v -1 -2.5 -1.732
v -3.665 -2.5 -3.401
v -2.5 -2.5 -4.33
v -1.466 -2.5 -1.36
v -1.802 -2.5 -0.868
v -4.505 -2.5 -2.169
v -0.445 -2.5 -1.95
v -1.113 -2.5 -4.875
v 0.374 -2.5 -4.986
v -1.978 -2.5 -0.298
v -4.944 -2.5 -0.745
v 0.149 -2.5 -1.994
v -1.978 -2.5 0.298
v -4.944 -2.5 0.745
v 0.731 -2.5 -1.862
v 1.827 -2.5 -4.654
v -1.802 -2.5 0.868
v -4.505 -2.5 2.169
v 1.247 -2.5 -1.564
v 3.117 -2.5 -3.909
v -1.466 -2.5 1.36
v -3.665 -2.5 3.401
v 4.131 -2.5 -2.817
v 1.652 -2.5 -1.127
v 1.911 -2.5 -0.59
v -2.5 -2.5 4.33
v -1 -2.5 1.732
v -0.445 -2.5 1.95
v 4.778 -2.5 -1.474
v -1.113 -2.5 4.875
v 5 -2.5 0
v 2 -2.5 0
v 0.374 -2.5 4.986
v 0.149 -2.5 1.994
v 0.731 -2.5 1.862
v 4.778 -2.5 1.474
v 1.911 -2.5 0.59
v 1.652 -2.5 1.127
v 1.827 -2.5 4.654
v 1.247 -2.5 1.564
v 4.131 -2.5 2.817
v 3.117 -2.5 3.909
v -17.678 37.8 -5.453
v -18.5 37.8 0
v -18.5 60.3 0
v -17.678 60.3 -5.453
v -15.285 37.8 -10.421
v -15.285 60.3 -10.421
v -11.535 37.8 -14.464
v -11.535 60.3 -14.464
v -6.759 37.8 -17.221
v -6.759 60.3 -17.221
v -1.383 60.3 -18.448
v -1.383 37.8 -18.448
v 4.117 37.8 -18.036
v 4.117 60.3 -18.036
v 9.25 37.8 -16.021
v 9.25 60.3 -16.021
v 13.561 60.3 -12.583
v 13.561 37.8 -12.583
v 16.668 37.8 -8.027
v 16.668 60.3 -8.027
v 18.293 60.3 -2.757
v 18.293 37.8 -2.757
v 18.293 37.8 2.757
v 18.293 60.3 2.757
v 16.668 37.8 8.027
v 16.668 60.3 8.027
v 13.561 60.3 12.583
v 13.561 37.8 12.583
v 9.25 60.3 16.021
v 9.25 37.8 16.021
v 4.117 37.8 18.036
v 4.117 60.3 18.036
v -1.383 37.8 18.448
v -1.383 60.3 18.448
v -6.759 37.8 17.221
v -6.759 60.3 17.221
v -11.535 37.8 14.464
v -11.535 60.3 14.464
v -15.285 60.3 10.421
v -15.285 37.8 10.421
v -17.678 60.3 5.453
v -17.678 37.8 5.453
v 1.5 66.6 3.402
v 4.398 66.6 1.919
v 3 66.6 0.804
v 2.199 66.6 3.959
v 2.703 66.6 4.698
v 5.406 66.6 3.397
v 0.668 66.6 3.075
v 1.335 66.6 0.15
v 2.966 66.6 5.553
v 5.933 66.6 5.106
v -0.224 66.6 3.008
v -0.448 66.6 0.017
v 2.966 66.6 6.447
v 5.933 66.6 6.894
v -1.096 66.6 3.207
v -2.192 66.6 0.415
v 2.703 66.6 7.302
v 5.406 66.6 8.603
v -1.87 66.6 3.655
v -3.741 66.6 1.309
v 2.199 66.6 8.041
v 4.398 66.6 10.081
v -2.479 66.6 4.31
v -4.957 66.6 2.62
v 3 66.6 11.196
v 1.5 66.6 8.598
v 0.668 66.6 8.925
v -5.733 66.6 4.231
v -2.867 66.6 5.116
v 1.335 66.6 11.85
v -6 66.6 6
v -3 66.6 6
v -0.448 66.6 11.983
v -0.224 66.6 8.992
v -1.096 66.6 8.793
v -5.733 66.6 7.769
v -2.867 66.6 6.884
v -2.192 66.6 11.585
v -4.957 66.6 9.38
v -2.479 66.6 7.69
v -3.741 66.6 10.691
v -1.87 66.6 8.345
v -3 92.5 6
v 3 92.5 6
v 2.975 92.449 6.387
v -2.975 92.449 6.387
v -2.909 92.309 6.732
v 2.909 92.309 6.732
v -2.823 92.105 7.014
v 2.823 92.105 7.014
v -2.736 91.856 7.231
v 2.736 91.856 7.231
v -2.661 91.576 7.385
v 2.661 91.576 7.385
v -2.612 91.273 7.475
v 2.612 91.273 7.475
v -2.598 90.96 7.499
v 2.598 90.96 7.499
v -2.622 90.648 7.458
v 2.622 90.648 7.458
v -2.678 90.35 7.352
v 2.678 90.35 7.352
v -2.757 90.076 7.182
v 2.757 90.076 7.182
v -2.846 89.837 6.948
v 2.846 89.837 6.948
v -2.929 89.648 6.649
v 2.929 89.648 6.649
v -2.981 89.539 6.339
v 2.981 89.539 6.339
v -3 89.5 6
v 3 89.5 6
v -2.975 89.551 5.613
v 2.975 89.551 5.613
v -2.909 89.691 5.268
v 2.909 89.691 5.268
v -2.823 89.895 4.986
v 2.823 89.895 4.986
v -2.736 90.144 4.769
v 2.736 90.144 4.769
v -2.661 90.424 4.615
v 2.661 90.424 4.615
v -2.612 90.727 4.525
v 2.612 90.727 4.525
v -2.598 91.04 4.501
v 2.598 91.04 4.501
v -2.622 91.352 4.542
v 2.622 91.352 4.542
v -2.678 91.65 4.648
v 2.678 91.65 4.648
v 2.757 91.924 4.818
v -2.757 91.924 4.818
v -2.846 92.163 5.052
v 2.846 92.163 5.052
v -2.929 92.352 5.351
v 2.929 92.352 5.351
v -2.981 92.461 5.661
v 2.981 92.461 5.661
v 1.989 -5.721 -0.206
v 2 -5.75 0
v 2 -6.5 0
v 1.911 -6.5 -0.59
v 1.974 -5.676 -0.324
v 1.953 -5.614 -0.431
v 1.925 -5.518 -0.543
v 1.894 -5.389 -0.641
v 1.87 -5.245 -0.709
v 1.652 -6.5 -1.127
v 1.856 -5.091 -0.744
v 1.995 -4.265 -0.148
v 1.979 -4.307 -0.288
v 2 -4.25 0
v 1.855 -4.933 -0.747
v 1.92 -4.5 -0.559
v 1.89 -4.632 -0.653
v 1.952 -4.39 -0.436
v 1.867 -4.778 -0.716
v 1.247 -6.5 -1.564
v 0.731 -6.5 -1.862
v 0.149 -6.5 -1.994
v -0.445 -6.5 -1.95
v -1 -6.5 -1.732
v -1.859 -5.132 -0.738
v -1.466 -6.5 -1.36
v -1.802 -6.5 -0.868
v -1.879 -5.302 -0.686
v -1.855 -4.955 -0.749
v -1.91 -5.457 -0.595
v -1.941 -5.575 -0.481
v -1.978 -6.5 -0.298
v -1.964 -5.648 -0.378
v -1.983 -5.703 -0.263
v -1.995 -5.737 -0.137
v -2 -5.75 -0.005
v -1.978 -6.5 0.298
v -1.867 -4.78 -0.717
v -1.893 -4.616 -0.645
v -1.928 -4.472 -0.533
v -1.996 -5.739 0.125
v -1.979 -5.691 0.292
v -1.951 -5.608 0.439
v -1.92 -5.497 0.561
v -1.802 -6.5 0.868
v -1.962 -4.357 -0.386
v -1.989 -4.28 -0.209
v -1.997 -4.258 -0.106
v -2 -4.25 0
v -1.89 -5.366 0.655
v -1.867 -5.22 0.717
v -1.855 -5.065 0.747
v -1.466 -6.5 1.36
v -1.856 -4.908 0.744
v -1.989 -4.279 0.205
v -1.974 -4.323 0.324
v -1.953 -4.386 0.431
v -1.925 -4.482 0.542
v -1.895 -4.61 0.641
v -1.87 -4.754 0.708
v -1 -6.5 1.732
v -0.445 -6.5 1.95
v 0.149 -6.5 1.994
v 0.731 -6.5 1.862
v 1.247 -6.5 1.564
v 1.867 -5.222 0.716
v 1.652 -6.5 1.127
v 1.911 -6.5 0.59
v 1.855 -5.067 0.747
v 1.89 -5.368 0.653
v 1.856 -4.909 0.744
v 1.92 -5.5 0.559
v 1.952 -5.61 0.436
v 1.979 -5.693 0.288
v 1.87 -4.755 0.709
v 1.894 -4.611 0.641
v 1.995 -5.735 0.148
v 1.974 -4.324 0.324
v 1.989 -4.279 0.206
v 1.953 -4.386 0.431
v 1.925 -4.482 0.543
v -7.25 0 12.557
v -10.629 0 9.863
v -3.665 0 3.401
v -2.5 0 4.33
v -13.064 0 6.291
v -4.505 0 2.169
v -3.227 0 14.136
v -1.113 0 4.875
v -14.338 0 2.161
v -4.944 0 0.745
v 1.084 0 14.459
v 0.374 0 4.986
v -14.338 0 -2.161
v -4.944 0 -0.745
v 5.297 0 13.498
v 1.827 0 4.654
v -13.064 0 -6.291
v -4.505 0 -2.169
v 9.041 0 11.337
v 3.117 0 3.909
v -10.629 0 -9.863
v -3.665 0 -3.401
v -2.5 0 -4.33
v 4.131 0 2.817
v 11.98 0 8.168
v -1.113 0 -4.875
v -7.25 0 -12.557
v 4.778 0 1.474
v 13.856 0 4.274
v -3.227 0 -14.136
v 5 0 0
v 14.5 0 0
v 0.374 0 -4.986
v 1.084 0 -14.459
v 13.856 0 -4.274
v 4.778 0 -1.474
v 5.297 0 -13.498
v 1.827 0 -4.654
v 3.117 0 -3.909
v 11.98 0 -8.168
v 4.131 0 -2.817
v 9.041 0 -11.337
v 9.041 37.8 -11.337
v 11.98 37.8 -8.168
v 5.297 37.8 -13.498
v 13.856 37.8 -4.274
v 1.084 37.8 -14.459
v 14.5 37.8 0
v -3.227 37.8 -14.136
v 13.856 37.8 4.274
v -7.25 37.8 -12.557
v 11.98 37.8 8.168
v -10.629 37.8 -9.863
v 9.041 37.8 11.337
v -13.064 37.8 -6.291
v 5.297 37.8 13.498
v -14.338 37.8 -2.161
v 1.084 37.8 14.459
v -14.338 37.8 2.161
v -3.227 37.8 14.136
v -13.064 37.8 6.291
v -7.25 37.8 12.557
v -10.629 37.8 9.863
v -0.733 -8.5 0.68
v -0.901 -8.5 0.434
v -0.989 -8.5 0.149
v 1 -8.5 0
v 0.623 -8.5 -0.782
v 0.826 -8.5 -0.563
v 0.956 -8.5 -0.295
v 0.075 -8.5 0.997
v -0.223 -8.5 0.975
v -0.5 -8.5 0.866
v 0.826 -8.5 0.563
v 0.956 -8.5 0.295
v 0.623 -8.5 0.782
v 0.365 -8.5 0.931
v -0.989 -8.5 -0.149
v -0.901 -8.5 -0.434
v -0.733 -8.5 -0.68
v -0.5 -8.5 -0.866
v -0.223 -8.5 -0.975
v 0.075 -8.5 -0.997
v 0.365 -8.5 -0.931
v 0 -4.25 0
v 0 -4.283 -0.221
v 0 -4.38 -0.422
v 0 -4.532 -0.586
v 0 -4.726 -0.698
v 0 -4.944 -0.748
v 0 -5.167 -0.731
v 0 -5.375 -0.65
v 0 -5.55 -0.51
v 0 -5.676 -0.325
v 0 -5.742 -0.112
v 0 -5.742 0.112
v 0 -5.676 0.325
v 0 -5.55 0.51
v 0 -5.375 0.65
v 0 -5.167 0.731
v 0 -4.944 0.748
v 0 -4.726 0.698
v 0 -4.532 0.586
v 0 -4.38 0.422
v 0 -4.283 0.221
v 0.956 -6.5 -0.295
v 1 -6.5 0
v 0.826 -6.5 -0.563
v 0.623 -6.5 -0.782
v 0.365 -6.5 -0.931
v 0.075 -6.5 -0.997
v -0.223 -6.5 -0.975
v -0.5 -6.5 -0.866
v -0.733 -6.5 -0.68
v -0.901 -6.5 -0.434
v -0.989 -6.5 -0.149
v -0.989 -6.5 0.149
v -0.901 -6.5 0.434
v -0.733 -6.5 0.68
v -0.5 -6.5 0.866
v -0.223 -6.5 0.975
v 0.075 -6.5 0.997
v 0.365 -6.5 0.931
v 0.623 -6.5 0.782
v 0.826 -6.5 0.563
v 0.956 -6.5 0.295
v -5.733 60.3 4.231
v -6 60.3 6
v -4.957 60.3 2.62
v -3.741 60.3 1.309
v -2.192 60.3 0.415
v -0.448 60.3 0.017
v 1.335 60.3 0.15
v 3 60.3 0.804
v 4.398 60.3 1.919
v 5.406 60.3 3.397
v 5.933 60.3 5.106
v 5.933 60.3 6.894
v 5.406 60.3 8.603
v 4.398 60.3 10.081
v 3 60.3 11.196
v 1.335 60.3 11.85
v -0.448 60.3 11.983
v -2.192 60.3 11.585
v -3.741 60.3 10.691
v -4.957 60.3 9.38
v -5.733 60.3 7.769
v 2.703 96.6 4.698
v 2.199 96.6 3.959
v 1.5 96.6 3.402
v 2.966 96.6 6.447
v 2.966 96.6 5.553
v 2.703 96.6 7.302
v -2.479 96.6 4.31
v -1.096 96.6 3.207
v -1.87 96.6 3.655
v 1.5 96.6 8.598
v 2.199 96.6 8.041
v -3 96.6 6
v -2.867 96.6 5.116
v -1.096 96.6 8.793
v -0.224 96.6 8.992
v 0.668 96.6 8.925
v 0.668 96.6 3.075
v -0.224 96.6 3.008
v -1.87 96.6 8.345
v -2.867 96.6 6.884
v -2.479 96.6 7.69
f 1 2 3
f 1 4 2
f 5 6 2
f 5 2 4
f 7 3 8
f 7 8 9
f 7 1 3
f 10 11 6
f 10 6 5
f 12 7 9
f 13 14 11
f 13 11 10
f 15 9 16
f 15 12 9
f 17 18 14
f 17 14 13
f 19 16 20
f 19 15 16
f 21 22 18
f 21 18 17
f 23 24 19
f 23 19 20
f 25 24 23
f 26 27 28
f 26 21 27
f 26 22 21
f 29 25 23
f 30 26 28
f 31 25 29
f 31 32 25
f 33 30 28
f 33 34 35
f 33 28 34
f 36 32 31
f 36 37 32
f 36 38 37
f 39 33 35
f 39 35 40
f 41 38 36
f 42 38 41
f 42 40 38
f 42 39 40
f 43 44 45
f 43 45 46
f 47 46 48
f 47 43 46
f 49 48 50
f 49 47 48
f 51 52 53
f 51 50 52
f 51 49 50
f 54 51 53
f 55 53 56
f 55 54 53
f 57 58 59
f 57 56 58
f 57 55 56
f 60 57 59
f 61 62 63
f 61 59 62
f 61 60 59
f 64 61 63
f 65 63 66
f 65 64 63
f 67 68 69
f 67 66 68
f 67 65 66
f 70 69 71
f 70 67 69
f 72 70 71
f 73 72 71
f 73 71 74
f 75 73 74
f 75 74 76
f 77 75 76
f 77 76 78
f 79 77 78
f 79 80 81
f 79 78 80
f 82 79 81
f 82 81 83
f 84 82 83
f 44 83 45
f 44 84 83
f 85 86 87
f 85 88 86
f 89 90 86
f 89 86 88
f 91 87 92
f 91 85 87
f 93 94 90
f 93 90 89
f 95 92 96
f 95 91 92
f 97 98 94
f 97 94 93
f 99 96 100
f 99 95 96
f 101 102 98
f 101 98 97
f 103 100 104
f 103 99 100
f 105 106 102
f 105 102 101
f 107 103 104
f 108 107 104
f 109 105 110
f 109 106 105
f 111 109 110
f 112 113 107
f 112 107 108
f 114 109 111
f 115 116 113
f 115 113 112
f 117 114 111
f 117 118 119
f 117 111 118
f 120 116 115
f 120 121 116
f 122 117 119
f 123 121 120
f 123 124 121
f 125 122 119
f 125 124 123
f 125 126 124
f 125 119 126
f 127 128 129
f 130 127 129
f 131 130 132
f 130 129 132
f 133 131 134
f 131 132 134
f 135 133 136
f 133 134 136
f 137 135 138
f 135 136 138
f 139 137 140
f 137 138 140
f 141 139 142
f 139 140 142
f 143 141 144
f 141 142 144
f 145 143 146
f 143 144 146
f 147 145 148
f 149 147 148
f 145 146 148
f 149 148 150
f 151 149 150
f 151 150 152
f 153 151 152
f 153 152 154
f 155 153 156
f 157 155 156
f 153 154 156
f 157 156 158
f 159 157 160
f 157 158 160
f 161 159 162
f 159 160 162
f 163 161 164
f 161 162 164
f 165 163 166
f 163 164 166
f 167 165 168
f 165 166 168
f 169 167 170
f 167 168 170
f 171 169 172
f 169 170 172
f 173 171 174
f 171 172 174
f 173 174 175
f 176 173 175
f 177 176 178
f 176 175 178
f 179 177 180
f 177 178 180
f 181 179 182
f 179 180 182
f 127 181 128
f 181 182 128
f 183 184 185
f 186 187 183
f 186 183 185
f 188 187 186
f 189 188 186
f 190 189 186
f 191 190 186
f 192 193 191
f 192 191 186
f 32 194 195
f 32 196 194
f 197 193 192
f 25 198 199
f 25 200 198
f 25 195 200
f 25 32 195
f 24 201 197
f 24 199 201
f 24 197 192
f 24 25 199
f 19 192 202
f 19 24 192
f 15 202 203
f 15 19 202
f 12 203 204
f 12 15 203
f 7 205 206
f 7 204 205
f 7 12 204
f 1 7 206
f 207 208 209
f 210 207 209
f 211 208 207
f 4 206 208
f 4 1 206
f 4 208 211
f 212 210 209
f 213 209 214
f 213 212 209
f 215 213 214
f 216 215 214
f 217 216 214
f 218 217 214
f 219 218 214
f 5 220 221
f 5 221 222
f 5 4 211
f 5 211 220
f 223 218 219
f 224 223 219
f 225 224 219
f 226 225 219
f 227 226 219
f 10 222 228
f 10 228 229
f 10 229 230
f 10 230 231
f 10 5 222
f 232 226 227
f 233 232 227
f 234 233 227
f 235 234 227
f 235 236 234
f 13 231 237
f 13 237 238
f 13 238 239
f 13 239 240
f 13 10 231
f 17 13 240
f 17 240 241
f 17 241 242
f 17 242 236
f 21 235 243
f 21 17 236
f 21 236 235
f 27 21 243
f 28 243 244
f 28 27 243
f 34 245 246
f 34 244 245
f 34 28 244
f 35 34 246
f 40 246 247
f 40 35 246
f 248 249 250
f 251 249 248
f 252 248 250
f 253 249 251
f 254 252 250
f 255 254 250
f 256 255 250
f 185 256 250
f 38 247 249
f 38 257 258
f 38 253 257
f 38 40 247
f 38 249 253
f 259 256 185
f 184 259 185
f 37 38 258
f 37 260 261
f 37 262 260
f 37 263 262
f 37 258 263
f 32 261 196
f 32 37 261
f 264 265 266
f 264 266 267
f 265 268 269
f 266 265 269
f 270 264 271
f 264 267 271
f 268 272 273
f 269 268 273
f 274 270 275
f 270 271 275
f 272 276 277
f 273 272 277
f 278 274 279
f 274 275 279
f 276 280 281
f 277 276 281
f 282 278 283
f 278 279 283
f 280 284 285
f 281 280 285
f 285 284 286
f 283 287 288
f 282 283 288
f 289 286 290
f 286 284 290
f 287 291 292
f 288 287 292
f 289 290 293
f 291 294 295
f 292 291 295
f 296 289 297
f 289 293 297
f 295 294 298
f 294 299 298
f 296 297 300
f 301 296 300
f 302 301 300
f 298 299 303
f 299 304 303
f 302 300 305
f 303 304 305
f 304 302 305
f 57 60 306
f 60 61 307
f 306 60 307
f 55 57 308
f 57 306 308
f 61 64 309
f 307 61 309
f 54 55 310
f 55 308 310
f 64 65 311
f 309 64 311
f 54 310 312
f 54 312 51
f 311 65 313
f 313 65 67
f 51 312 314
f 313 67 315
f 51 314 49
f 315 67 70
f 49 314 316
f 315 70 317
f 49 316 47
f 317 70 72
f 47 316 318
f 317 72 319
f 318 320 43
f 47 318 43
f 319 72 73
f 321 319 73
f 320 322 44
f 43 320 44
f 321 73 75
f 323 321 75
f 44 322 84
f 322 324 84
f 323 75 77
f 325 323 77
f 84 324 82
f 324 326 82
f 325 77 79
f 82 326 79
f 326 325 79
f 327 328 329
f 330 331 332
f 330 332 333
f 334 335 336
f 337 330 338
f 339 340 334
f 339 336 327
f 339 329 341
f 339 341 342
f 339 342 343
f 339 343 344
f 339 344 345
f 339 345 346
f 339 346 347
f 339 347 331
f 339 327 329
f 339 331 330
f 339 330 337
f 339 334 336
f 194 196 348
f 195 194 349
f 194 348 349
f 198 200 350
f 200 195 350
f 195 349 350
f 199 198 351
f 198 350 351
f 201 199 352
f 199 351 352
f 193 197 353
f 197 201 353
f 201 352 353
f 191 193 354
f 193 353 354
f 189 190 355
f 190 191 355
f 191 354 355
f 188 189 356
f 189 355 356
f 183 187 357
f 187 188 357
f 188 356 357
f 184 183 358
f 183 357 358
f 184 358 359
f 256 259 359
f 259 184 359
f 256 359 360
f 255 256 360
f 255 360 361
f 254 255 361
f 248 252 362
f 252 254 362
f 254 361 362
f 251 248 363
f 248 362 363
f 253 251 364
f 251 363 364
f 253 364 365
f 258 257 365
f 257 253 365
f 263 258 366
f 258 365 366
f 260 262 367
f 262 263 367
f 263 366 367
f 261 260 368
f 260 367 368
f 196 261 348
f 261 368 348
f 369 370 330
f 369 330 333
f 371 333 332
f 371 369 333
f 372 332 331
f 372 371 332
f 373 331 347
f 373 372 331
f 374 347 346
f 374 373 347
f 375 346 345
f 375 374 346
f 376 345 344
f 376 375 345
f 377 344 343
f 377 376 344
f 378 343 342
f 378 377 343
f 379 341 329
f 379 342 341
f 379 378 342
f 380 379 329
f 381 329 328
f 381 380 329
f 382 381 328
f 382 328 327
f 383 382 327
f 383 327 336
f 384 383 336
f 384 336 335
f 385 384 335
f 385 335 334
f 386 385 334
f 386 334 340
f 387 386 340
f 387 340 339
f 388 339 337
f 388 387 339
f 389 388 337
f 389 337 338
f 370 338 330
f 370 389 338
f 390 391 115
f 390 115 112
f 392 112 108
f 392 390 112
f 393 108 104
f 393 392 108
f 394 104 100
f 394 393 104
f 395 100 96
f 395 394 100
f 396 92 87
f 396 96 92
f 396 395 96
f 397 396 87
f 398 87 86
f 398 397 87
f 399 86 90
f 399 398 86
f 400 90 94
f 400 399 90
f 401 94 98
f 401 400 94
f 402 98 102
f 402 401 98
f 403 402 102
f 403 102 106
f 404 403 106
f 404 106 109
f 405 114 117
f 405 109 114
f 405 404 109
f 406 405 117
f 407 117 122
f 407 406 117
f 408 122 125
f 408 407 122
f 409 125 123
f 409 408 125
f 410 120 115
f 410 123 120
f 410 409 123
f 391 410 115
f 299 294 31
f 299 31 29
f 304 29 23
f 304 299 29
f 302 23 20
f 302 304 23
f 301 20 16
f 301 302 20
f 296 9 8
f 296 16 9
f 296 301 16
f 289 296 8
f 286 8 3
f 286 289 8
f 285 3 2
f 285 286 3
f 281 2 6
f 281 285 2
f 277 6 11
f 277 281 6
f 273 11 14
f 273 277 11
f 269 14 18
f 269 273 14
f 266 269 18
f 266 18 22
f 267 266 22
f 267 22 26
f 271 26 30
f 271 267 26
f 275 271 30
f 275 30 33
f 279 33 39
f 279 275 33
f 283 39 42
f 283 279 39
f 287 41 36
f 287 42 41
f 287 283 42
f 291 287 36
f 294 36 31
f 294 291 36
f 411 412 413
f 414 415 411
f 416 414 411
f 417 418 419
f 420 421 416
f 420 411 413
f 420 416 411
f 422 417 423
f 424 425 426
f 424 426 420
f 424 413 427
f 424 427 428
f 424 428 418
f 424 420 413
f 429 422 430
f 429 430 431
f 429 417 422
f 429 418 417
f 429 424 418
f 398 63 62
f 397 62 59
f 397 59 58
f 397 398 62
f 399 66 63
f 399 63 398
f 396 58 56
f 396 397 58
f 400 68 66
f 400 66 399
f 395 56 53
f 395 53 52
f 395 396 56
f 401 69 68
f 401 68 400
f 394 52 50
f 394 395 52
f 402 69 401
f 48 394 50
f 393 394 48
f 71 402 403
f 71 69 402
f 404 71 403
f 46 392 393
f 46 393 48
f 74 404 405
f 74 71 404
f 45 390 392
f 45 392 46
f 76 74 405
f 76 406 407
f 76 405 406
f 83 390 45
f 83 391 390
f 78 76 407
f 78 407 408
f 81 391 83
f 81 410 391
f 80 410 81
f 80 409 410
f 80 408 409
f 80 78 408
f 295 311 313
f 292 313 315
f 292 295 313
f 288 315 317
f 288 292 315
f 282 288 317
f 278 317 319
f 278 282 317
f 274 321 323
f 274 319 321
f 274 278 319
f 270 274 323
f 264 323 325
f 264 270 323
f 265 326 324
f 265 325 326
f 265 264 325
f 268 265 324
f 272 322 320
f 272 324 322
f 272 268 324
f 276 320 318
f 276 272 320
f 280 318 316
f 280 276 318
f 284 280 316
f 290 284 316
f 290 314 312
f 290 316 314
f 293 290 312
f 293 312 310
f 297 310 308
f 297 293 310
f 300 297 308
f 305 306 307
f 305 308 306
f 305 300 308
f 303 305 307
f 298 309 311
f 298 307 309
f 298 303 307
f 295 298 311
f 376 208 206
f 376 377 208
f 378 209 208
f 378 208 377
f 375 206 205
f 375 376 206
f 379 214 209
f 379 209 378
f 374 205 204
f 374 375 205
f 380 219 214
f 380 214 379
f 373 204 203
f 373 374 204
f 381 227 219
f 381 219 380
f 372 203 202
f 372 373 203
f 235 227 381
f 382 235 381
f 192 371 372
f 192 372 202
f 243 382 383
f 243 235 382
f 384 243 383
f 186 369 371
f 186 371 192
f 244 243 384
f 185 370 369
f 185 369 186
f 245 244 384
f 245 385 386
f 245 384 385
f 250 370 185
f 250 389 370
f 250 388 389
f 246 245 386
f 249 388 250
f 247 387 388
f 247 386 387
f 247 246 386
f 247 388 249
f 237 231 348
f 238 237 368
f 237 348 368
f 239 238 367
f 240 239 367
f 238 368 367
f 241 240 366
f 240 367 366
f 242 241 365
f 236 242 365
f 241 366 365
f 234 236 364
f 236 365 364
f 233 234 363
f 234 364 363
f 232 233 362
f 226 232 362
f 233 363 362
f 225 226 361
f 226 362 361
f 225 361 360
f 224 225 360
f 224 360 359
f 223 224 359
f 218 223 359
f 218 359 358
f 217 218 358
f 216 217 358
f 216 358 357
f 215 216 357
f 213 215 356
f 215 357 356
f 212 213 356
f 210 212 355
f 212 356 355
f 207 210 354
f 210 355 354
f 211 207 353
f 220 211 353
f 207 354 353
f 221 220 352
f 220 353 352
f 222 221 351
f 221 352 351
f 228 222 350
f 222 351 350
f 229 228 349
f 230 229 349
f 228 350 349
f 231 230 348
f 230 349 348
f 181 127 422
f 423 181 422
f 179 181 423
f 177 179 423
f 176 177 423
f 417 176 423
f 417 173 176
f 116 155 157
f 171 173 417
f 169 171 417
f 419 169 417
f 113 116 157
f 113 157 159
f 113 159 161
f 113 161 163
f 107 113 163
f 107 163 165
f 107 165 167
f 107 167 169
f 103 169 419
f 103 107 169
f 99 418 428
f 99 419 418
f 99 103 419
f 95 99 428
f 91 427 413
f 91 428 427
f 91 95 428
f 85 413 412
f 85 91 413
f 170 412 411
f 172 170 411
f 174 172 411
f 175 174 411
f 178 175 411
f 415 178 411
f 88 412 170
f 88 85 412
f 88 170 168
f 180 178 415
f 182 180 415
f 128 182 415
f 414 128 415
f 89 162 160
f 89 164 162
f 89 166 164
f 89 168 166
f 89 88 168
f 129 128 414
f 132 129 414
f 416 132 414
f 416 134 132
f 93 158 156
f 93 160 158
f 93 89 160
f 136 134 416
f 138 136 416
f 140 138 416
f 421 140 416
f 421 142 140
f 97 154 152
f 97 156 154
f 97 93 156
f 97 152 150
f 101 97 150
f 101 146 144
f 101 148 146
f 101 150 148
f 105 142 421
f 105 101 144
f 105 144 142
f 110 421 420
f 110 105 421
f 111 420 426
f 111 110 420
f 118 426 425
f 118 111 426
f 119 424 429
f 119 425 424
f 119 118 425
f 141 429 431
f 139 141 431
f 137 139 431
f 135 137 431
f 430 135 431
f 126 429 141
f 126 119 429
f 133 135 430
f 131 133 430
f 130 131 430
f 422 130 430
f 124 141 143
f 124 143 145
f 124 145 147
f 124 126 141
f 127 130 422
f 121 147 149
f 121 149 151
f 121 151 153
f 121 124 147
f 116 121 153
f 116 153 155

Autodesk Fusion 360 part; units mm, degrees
sketch "Sketch1" plane through (0, 0, 0) normal (0, 1, 0) x (1, 0, 0)
  circle A0 centre (0, 0) radius 14.5
  dimension "d1" = 29
extrude "Extrude1" add sketch "Sketch1" along normal blind 37.8
sketch "Sketch2" plane through (0, 37.8, 0) normal (0, 1, 0) x (-1, 0, 0)
  circle A0 centre (0, 0) radius 14.5
  circle A1 centre (0, 0) radius 18.5
  dimension "d4" = 37
extrude "Extrude2" add sketch "Sketch2" along normal blind 22.5 contours A0 | A1
sketch "Sketch3" plane through (0, 60.3, 0) normal (0, 1, 0) x (-1, 0, 0)
  circle A0 centre (0, 0) radius 18.5
  circle A1 centre (0, 6) radius 6
  dimension "d7" = 12
extrude "Extrude3" add sketch "Sketch3" along normal blind 6.3 contours A1
sketch "Sketch4" plane through (0, 66.6, 0) normal (0, 1, 0) x (-1, 0, 0)
  circle A0 centre (0, 6) radius 6
  circle A1 centre (0, 6) radius 3
  dimension "d10" = 6
extrude "Extrude4" add sketch "Sketch4" along normal blind 30 contours A1
sketch "Sketch5" plane through (0, 0, 0) normal (1, 0, 0) x (0, 1, 0)
sketch "Sketch6" plane through (0, 0, 0) normal (1, 0, 0) x (0, 1, 0)
  circle A0 centre (91, 6) radius 1.5
  dimension "d13" = 3
extrude "Extrude5" cut sketch "Sketch6" along normal mid plane 6
sketch "Sketch7" plane through (0, 0, 0) normal (0, -1, 0) x (1, 0, 0)
  circle A0 centre (0, 0) radius 14.5
  circle A1 centre (0, 0) radius 5
  dimension "d16" = 10
extrude "Extrude6" add sketch "Sketch7" along normal blind 2.5 contours A1
sketch "Sketch8" plane through (0, -2.5, 0) normal (0, -1, 0) x (1, 0, 0)
  circle A0 centre (0, 0) radius 5
  circle A1 centre (0, 0) radius 2
  dimension "d19" = 4
extrude "Extrude7" add sketch "Sketch8" along normal blind 4 contours A1
sketch "Sketch9" plane through (0, -6.5, 0) normal (0, -1, 0) x (1, 0, 0)
  circle A0 centre (0, 0) radius 2
  circle A1 centre (0, 0) radius 1
  dimension "d22" = 2
extrude "Extrude8" add sketch "Sketch9" along normal blind 2 contours A1
sketch "Sketch10" plane through (0, 0, 0) normal (1, 0, 0) x (0, 1, 0)
  circle A0 centre (-5, 0) radius 0.75
  dimension "d25" = 1.5
extrude "Extrude9" cut sketch "Sketch10" along normal mid plane 5
